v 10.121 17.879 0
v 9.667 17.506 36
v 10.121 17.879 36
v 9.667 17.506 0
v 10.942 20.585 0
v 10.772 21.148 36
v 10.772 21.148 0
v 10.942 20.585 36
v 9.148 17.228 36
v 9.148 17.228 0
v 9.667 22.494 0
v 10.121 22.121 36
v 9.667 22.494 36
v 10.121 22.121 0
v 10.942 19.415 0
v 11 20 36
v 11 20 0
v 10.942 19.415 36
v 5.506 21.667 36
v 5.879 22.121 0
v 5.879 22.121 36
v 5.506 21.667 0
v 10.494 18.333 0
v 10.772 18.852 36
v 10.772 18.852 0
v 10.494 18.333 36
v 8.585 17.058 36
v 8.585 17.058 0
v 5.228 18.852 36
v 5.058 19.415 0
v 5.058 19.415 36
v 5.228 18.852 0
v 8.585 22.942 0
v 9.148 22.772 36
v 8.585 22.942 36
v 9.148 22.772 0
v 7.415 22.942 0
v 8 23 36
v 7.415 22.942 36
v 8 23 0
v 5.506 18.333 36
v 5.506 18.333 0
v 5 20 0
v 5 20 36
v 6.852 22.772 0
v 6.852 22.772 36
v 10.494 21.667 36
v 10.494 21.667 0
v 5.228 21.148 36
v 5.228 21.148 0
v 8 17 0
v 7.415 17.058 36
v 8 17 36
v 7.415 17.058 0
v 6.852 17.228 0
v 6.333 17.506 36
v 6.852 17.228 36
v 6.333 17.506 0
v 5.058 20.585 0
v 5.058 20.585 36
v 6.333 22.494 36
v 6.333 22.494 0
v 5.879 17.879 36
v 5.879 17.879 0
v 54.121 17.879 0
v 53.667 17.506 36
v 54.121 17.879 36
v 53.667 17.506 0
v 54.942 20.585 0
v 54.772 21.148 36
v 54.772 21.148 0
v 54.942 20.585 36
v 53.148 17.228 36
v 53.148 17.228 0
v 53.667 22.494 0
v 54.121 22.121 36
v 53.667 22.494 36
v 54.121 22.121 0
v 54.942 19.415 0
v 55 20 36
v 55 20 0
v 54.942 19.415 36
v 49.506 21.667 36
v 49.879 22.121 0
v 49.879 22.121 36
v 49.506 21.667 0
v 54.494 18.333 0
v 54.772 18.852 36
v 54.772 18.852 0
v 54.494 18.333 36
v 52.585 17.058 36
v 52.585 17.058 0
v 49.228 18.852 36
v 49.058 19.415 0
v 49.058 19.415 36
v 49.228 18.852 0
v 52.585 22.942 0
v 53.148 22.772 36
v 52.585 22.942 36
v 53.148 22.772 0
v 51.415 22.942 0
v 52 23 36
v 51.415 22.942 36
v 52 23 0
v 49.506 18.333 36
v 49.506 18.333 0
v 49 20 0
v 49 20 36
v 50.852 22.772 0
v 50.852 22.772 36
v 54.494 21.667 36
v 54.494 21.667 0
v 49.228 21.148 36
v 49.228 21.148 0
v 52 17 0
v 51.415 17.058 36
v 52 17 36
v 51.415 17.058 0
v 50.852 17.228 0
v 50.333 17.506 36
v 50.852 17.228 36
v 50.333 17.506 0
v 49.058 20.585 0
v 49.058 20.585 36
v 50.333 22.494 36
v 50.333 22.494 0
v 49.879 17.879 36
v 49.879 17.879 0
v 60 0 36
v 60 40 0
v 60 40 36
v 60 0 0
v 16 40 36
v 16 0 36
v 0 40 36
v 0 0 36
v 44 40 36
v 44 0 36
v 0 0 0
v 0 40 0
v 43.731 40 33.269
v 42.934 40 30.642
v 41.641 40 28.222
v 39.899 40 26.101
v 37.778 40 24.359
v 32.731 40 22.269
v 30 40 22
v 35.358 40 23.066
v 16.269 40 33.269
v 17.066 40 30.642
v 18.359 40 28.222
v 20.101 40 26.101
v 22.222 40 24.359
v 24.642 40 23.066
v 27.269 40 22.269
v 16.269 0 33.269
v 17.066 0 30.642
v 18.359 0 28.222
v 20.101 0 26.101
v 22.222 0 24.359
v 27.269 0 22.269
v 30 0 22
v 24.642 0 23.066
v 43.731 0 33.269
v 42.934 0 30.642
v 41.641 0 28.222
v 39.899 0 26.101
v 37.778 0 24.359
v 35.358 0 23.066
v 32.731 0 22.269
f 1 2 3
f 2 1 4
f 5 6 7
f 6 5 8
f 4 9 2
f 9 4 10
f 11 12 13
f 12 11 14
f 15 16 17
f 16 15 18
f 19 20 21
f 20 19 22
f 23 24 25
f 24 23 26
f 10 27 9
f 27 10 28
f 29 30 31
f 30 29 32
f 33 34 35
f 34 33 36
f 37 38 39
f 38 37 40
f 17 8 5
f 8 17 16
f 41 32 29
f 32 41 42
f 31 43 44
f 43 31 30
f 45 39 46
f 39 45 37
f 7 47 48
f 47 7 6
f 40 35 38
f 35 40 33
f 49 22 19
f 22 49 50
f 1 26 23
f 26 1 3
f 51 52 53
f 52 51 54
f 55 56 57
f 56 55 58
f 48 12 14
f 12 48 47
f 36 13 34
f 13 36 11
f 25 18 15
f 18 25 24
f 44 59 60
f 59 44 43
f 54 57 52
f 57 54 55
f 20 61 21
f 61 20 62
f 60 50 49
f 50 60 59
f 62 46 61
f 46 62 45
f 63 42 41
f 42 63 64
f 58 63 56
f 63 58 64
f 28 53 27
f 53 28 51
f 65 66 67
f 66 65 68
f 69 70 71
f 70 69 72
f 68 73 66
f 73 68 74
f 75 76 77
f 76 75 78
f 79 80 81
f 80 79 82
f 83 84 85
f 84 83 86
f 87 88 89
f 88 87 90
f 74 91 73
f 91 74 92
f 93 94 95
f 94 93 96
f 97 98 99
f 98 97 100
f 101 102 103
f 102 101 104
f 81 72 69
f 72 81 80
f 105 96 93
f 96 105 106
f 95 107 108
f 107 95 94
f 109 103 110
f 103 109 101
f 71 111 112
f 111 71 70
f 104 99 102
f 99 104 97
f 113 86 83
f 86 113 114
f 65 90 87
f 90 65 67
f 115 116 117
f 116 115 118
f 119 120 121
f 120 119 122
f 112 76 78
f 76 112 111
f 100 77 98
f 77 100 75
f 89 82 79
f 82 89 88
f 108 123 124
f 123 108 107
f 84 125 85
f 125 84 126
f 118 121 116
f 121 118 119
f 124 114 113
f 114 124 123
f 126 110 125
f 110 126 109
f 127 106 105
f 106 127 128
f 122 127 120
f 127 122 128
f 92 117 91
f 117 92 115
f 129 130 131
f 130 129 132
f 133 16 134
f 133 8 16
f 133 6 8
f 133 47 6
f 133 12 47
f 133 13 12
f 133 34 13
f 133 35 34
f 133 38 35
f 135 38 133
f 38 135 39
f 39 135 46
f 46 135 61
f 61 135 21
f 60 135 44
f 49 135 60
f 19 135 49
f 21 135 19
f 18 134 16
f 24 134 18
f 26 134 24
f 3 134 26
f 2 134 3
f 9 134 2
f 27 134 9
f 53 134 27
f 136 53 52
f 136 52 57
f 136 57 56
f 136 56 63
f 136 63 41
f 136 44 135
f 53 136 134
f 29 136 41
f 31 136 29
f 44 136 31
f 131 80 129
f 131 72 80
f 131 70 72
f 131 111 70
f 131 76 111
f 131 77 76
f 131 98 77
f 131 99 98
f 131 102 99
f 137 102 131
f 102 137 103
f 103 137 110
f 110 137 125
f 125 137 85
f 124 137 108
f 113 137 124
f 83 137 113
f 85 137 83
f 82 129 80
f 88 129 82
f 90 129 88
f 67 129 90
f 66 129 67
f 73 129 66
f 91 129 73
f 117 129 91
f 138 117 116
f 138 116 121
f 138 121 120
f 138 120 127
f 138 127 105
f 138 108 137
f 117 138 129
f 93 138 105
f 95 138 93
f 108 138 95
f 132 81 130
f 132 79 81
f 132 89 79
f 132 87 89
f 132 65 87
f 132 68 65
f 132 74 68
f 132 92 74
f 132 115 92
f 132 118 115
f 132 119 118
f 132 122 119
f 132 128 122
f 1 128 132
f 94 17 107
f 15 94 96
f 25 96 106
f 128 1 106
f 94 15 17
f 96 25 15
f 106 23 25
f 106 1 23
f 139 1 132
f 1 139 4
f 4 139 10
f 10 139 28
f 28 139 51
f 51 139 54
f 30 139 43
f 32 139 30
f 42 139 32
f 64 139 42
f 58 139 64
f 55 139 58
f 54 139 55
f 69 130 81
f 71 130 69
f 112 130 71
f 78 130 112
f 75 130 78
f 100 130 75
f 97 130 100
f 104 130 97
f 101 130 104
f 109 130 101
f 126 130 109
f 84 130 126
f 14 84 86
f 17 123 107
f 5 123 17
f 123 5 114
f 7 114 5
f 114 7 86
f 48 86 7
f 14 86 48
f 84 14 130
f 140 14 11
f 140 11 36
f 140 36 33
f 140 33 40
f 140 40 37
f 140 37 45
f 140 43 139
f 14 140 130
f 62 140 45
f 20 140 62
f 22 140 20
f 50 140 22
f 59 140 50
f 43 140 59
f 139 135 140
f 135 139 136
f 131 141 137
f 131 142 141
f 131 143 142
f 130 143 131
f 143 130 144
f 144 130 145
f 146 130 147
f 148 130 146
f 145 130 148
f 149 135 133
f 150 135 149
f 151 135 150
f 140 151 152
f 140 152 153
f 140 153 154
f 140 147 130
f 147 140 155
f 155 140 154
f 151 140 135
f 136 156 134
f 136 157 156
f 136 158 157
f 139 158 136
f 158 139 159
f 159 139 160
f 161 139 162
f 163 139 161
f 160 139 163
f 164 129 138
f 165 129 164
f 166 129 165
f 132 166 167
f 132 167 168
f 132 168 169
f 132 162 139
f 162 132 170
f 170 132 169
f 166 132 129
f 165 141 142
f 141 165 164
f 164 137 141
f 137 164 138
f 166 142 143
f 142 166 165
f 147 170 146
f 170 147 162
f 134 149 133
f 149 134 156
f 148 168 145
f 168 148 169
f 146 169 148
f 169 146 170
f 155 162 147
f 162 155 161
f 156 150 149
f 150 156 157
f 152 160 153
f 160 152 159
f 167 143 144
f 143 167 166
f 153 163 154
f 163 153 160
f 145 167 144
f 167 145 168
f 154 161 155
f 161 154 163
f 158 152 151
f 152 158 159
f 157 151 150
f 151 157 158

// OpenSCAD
$fn = 32;

// ----------------------------------------------------------------------
// Saddle clamp: plain shaft clamp
// ----------------------------------------------------------------------

// --- parameters (mm) ---
blk_l = 60;               // block length, X
blk_w = 40;               // block width, Y
blk_h = 36;               // block height
clamp_r = 14;             // shaft groove radius
hole_r = 3;               // bolt hole radius
hole_m = 8;               // bolt hole margin from the ends

saw_depth = clamp_r + 3;  // saw kerf depth

difference() {
  cube([blk_l, blk_w, blk_h]);
  translate([blk_l / 2, -1, blk_h])
    rotate([-90, 0, 0])
      cylinder(h = blk_w + 2, r = clamp_r);
  for (sx = [0, 1])
    translate([sx ? blk_l - hole_m : hole_m, blk_w / 2, -1])
      cylinder(r = hole_r, h = blk_h + 2);
}
